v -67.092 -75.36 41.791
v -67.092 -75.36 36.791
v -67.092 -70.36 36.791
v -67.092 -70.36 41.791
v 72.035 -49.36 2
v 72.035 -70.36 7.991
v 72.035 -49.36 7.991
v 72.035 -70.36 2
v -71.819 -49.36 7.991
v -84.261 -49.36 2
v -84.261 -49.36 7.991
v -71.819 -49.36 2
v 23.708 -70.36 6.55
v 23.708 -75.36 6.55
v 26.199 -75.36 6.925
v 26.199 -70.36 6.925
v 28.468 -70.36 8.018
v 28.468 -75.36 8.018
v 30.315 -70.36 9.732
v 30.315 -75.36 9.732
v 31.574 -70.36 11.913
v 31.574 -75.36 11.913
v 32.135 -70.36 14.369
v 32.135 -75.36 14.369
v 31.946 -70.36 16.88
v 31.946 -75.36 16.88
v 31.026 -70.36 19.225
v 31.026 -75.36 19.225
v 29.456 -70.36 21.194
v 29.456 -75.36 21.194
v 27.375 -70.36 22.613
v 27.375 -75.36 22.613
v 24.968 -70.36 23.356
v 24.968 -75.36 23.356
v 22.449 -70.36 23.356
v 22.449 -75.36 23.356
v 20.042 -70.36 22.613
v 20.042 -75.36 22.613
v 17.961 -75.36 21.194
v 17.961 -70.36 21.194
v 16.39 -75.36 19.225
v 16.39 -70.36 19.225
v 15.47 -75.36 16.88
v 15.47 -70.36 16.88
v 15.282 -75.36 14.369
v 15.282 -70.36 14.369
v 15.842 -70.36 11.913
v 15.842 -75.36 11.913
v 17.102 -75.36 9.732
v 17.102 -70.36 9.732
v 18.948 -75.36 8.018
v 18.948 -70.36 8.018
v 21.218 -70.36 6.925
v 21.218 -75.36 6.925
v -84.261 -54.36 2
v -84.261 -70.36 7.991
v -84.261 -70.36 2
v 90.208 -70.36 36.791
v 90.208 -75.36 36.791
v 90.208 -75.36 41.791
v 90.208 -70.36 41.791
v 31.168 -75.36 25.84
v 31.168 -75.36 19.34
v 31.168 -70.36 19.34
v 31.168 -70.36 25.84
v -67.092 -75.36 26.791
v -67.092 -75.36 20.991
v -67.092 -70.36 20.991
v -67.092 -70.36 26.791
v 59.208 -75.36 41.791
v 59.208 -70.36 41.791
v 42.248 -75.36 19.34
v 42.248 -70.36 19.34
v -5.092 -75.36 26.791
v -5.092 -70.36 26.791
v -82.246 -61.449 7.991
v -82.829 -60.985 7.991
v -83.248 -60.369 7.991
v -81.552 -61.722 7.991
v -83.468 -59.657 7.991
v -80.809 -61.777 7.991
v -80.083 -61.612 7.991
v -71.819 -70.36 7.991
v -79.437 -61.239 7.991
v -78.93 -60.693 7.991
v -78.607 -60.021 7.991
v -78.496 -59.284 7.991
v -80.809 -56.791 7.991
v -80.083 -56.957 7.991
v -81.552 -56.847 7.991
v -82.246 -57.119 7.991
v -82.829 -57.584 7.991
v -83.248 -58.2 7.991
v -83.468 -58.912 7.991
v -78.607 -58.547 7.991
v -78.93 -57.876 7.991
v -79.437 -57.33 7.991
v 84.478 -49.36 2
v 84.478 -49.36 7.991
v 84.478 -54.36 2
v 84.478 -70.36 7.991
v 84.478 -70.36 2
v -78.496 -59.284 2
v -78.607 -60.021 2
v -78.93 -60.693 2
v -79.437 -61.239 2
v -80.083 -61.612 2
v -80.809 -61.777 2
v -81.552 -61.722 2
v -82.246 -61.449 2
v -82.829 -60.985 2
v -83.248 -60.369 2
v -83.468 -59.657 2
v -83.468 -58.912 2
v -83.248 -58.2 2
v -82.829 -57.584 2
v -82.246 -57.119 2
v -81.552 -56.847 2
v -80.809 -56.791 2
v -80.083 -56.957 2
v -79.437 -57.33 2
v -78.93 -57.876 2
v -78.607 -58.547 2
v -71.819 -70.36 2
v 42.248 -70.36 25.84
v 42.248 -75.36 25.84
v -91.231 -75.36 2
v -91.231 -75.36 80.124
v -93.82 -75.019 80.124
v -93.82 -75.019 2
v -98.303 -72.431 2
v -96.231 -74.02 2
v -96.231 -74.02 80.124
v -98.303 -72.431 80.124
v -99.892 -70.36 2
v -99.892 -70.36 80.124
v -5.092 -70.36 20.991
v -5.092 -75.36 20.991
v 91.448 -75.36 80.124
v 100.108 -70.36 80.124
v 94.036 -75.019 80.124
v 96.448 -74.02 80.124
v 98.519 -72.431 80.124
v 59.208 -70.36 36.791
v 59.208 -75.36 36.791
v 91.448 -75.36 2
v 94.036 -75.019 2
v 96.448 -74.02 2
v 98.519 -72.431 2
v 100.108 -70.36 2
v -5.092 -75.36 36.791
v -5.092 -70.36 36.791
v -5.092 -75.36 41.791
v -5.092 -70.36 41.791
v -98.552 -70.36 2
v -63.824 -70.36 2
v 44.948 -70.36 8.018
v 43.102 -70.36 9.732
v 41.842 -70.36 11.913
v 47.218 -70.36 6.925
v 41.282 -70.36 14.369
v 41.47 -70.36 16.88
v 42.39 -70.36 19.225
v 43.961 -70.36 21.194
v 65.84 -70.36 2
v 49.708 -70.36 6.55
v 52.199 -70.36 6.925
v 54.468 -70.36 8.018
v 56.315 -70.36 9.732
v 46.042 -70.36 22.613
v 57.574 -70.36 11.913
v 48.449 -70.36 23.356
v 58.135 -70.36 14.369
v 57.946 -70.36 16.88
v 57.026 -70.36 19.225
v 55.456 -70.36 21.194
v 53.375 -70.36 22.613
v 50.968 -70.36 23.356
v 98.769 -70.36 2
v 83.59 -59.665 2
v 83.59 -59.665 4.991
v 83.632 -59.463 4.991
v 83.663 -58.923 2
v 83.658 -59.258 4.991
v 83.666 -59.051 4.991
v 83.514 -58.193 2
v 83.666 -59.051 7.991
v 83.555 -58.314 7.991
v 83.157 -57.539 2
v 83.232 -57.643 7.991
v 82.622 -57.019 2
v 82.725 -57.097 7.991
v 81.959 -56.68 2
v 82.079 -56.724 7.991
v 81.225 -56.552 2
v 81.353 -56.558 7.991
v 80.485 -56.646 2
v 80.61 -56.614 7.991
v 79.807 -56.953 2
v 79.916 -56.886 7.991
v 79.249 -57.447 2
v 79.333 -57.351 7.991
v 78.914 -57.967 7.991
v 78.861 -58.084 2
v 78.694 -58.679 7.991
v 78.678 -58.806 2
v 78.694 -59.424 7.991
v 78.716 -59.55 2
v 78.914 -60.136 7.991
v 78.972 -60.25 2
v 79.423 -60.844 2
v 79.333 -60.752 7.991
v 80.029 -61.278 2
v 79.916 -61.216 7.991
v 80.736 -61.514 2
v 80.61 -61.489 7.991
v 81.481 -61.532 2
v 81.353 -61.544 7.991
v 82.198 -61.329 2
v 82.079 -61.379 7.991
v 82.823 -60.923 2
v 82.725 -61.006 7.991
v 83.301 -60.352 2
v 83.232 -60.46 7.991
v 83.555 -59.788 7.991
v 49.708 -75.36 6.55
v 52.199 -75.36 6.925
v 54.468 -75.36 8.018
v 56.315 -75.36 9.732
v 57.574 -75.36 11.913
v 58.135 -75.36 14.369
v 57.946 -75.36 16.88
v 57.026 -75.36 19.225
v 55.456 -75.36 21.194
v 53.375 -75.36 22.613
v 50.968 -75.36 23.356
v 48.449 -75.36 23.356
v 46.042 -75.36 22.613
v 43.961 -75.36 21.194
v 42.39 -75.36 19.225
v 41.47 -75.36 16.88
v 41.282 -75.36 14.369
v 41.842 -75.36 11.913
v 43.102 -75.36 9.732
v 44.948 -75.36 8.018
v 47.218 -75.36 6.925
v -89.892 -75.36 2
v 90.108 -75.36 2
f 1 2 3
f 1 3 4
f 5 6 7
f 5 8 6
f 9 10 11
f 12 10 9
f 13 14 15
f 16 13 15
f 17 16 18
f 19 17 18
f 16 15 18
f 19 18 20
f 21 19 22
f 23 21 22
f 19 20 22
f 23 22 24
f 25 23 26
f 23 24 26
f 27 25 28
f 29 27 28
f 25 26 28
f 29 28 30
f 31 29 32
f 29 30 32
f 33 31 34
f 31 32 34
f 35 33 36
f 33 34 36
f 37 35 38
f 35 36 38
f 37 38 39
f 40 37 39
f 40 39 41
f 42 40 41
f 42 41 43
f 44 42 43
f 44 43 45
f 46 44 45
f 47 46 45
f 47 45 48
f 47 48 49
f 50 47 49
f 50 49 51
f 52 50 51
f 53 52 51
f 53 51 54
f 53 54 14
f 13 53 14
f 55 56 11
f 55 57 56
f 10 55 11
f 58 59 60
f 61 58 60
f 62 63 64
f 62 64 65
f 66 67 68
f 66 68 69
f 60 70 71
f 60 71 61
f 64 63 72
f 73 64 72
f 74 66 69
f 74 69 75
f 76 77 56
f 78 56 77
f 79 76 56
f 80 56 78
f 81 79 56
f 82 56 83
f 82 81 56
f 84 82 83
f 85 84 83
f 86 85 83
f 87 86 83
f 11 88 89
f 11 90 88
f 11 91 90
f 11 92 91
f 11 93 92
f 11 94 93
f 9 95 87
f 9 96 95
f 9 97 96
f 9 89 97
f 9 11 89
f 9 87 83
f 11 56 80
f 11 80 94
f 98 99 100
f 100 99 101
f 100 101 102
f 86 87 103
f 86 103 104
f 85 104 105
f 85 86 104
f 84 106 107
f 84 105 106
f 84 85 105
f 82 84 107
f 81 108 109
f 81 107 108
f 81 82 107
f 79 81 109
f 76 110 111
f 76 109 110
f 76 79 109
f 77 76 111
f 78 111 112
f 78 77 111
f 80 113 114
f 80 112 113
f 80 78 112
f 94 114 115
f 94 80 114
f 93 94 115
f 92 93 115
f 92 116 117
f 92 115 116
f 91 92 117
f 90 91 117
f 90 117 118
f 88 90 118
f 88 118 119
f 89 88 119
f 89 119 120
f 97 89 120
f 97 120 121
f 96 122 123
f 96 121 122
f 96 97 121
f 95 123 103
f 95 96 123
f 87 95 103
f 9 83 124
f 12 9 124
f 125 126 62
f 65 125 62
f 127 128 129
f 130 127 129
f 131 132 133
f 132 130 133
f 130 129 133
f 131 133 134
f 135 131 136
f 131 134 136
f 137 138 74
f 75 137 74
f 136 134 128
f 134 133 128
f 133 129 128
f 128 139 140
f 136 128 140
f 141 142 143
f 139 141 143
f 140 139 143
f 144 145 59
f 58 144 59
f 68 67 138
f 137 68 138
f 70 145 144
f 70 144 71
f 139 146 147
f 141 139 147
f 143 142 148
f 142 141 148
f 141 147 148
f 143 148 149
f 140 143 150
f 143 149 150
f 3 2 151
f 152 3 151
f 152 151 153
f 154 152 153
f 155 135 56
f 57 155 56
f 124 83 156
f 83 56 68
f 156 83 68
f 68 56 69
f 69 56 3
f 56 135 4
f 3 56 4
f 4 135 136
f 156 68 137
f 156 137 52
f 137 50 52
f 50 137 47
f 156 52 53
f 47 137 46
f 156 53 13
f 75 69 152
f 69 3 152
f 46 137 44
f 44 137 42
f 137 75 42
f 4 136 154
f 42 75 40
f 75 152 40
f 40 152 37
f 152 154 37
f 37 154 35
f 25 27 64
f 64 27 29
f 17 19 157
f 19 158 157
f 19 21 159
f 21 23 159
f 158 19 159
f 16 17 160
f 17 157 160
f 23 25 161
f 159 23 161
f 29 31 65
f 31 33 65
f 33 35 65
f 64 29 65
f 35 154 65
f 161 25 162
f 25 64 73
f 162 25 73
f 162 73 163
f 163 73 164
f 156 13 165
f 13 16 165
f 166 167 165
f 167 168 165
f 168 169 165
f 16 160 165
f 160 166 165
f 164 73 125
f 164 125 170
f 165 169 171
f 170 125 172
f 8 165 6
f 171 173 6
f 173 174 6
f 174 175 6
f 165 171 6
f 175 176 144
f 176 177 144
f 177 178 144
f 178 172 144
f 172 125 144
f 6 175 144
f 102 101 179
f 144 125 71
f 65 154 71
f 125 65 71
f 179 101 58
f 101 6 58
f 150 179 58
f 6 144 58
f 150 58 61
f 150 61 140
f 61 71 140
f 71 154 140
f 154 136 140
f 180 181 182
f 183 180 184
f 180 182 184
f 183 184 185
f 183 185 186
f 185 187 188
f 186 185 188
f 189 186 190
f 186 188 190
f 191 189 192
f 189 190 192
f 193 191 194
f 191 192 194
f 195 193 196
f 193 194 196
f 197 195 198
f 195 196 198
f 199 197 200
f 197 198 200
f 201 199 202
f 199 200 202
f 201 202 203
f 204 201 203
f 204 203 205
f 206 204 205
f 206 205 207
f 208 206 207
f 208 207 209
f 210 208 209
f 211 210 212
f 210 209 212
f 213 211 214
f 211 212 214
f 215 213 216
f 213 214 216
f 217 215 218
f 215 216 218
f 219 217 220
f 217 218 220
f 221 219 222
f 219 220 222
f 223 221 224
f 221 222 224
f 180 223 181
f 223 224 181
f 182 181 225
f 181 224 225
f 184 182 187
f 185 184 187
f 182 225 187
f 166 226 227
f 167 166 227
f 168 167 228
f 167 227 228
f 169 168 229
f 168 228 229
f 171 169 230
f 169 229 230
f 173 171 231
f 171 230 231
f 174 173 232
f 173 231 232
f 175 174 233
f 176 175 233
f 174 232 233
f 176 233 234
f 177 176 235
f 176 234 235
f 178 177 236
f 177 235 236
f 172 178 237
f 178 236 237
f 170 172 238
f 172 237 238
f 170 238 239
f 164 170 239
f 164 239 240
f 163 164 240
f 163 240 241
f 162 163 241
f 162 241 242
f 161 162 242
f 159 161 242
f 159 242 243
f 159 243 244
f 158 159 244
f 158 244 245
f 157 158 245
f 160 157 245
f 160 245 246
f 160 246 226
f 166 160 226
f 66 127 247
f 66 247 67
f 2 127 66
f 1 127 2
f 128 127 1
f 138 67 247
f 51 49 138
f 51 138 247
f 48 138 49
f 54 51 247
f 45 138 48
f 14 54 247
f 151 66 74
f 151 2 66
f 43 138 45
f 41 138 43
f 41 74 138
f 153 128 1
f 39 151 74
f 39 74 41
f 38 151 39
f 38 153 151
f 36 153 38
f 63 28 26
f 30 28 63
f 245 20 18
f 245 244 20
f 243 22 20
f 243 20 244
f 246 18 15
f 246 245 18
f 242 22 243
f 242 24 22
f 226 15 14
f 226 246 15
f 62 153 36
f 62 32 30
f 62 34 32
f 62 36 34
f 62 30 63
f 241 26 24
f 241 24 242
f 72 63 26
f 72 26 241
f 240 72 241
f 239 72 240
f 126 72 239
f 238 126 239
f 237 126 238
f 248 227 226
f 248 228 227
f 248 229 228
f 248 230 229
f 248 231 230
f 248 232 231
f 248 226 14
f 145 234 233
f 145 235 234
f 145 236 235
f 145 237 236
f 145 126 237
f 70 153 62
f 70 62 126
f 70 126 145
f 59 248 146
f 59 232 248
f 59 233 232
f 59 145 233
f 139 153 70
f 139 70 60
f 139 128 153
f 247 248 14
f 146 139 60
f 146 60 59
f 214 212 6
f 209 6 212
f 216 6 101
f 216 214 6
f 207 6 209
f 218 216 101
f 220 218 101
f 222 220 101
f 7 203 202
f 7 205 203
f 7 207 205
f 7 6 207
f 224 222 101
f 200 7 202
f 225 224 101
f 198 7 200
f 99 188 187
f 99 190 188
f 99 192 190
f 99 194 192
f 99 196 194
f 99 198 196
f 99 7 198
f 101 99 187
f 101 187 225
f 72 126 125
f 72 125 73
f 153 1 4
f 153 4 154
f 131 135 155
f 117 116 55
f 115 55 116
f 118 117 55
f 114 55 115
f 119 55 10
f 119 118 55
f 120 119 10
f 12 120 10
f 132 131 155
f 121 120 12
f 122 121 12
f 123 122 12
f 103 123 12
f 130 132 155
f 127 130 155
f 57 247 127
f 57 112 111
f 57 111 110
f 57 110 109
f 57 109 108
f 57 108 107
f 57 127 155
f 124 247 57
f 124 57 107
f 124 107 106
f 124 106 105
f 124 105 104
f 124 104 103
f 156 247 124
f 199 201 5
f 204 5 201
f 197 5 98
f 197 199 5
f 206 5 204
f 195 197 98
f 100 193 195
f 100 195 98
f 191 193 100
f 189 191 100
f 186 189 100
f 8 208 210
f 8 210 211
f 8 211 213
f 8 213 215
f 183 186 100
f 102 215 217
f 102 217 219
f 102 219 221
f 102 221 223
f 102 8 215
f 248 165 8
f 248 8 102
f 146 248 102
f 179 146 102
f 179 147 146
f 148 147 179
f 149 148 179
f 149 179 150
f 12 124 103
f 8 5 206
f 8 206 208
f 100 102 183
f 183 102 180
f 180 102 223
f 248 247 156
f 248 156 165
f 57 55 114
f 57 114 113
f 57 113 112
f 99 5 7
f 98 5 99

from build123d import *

# Parameters (mm, degrees)
CROQUIS2_W              = 200
CROQUIS2_H              = 150
CROQUIS2_R              = 2
CROQUIS2_R_2            = 2.5
CROQUIS2_W_2            = 31.297292299
CROQUIS2_H_2            = 43.768728426
CROQUIS2_H_3            = 43.768728427
CROQUIS2_W_3            = 23.573907934
CROQUIS2_H_4            = 45.323962431
SALIENTE_EXTRUIR1_DEPTH = 2
REDONDEO1_R             = 10
BOSS_EXTRUDE1_DEPTH     = 25
SKETCH3_W               = 62.040442094
SKETCH3_H               = 5.530821024
BOSS_EXTRUDE2_DEPTH     = 22
SKETCH8_W               = 62.040442094
SKETCH8_H               = 5.530821024
BOSS_EXTRUDE6_DEPTH     = 13
SKETCH2_W               = 200
SKETCH2_H               = 78.124132015
SKETCH2_W_2             = 62.040442094
SKETCH2_H_2             = 5.530821024
BOSS_EXTRUDE3_DEPTH     = 5
SKETCH4_W               = 62.040442094
SKETCH4_H               = 5.530821024
BOSS_EXTRUDE4_DEPTH     = 19
SKETCH5_W               = 7.442573222
SKETCH5_H               = 2.991451355
BOSS_EXTRUDE5_DEPTH     = 21
SKETCH6_R               = 2.5
CUT_EXTRUDE1_DEPTH      = 151.539762497
FILLET1_R               = 10
CUT_EXTRUDE2_DEPTH      = 153.054859813
CUT_EXTRUDE2_DEPTH_BACK = 13
SKETCH9_R               = 2.463920505
SKETCH9_R_2             = 2.5
SKETCH9_W               = 62.040442094
SKETCH9_H               = 4.214652984
CUT_EXTRUDE3_DEPTH      = 26
CUT_EXTRUDE3_DEPTH_BACK = 215.68865463
SKETCH10_W              = 2
SKETCH10_H              = 21
SKETCH11_W              = 62
SKETCH11_H              = 5.8
SKETCH11_H_2            = 5
SKETCH11_W_2            = 31
CUT_EXTRUDE4_DEPTH      = 130.932832439
CROQUIS4_W              = 2.991451355
CROQUIS4_H              = 16
SALIENTE_EXTRUIR2_DEPTH = 5
CROQUIS5_W              = 12.442573222
CROQUIS5_H              = 2.991451355
SALIENTE_EXTRUIR3_DEPTH = 5
CROQUIS7_W              = 12.442573222
CROQUIS7_H              = 21
SALIENTE_EXTRUIR4_DEPTH = 3
CORTAR_EXTRUIR3_START   = -15
CROQUIS8_R              = 2.5
CORTAR_EXTRUIR3_DEPTH   = 15
CROQUIS9_W              = 2.991451355
CROQUIS9_H              = 16
SALIENTE_EXTRUIR5_DEPTH = 5
CROQUIS10_W             = 12.442573222
CROQUIS10_H             = 2.991451355
SALIENTE_EXTRUIR6_DEPTH = 5
CROQUIS11_W             = 12.442573222
CROQUIS11_H             = 21
SALIENTE_EXTRUIR7_DEPTH = 3
CORTAR_EXTRUIR4_START   = -11
CROQUIS12_R             = 2.5
CORTAR_EXTRUIR4_DEPTH   = 11
CROQUIS15_R             = 8.45
CROQUIS15_W             = 10
CROQUIS15_H             = 5
CORTAR_EXTRUIR8_DEPTH   = 111
CORTAR_EXTRUIR10_DEPTH  = 10


with BuildPart() as part:
    # Croquis2 → Saliente-Extruir1 (new body)
    with BuildSketch(Plane.XY):
        with Locations((0.108263467, -0.36008145)):
            Rectangle(CROQUIS2_W, CROQUIS2_H)
        with Locations((89.108263467, -66.5)):
            Circle(CROQUIS2_R, mode=Mode.SUBTRACT)
        with Locations((-88.891736533, -66.5)):
            Circle(CROQUIS2_R, mode=Mode.SUBTRACT)
        with Locations(Location((89.108263467, 65.779837101, 0), (0, 0, 180))):
            Circle(CROQUIS2_R, mode=Mode.SUBTRACT)
        with Locations(Location((-88.891736533, 65.779837101, 0), (0, 0, 180))):
            Circle(CROQUIS2_R, mode=Mode.SUBTRACT)
        with Locations((-80.865436179, -59.36008145)):
            Circle(CROQUIS2_R_2, mode=Mode.SUBTRACT)
        with Locations((81.108263467, -59.36008145)):
            Circle(CROQUIS2_R_2, mode=Mode.SUBTRACT)
        with Locations(Location((81.108263467, 58.63991855, 0), (0, 0, 180))):
            Circle(CROQUIS2_R_2, mode=Mode.SUBTRACT)
        with Locations(Location((-80.865436179, 58.63991855, 0), (0, 0, 180))):
            Circle(CROQUIS2_R_2, mode=Mode.SUBTRACT)
        with BuildLine():
            Line((-62.091736533, 70.63991855), (64.108263467, 70.63991855))
            ThreePointArc((64.108263467, 70.63991855), (66.108263467, 68.63991855), (64.108263467, 66.63991855))
            Line((64.108263467, 66.63991855), (-62.091736533, 66.63991855))
            ThreePointArc((-62.091736533, 66.63991855), (-64.091736533, 68.63991855), (-62.091736533, 70.63991855))
        make_face(mode=Mode.SUBTRACT)
        Polygon((-71.391736533, -12.902447307), (-71.391736533, 12.182284408), (-79.241736533, 12.28991855), (-83.891736533, 12.28991855), (-83.891736533, -13.01008145), (-79.241736533, -13.01008145), align=None, mode=Mode.SUBTRACT)
        with BuildLine():
            Line((92.108263467, 45.478381757), (92.108263467, -46.198544657))
            ThreePointArc((92.108263467, -46.198544657), (90.807295546, -47.897576736), (89.108263467, -46.596608814))
            Line((89.108263467, -46.596608814), (89.108263467, 45.876445915))
            ThreePointArc((89.108263467, 45.876445915), (90.807295546, 47.177413836), (92.108263467, 45.478381757))
        make_face(mode=Mode.SUBTRACT)
        Polygon((84.108263467, 12.28991855), (84.108263467, -13.01008145), (79.458263467, -13.01008145), (71.608263467, -13.01008145), (71.608263467, 12.28991855), (79.458263467, 12.28991855), align=None, mode=Mode.SUBTRACT)
        with BuildLine():
            Line((-91.891736533, 45.478381757), (-91.891736533, -46.198544657))
            ThreePointArc((-91.891736533, -46.198544657), (-90.590768612, -47.897576736), (-88.891736533, -46.596608814))
            Line((-88.891736533, -46.596608814), (-88.891736533, 45.876445915))
            ThreePointArc((-88.891736533, 45.876445915), (-90.590768612, 47.177413836), (-91.891736533, 45.478381757))
        make_face(mode=Mode.SUBTRACT)
        with Locations((-30.011405388, 36.299005811)):
            Rectangle(CROQUIS2_W_2, CROQUIS2_H_2, mode=Mode.SUBTRACT)
        with BuildLine():
            Line((-62.091736533, -71.36008145), (64.108263467, -71.36008145))
            ThreePointArc((64.108263467, -71.36008145), (66.108263467, -69.36008145), (64.108263467, -67.36008145))
            Line((64.108263467, -67.36008145), (-62.091736533, -67.36008145))
            ThreePointArc((-62.091736533, -67.36008145), (-64.091736533, -69.36008145), (-62.091736533, -71.36008145))
        make_face(mode=Mode.SUBTRACT)
        with Locations((-30.011405388, -26.799059535)):
            Rectangle(CROQUIS2_W_2, CROQUIS2_H_3, mode=Mode.SUBTRACT)
        with Locations((12.982877294, -0.693345879)):
            Rectangle(CROQUIS2_W_3, CROQUIS2_H_4, mode=Mode.SUBTRACT)
    extrude(amount=SALIENTE_EXTRUIR1_DEPTH)

    # Redondeo1
    redondeo1_edges = [part.edges().sort_by_distance(p)[0] for p in [
        (100.108263467, -75.36008145, 1),
        (-99.891736533, -75.36008145, 1),
        (-99.891736533, 74.63991855, 1),
        (100.108263467, 74.63991855, 1),
    ]]
    fillet(redondeo1_edges, radius=REDONDEO1_R)

    # Sketch1 → Boss-Extrude1 (add)
    with BuildSketch(Plane.XY.offset(2)):
        Polygon((-67.071845217, 64.63991855), (-67.071845217, 60.63991855), (-8.841198185, 60.63991855), (-8.841198185, 3.63991855), (-67.071845217, 3.63991855), (-67.071845217, -0.36008145), (-8.841198185, -0.36008145), (-8.841198185, -53.36008145), (-67.071845217, -53.36008145), (-67.071845217, -57.574734434), (-5.031403123, -57.574734434), (-5.031403123, -40.931443482), (46.608263467, -40.931443482), (46.608263467, -36.931443482), (-5.031403123, -36.931443482), (-5.031403123, 30.068556518), (46.608263467, 30.068556518), (46.608263467, 34.068556518), (-5.031403123, 34.068556518), (-5.031403123, 64.63991855), align=None)
    extrude(amount=BOSS_EXTRUDE1_DEPTH)

    # Sketch3 → Boss-Extrude2 (add)
    with BuildSketch(Plane.XZ.offset(57.574734434)):
        with Locations((-36.05162417, 24.234589488)):
            Rectangle(SKETCH3_W, SKETCH3_H)
    extrude(amount=BOSS_EXTRUDE2_DEPTH)

    # Sketch8 → Boss-Extrude6 (add)
    with BuildSketch(Plane(origin=(0, 64.63991855, 0), x_dir=(1, 0, 0), z_dir=(0, 1, 0))):
        with Locations((-36.05162417, -24.234589488)):
            Rectangle(SKETCH8_W, SKETCH8_H)
    extrude(amount=BOSS_EXTRUDE6_DEPTH)

    # Sketch2 → Boss-Extrude3 (add)
    with BuildSketch(Plane.XZ.offset(75.36008145)):
        with Locations((0.108263467, 41.062066008)):
            Rectangle(SKETCH2_W, SKETCH2_H)
        with Locations((-36.05162417, 24.234589488)):
            Rectangle(SKETCH2_W_2, SKETCH2_H_2, mode=Mode.SUBTRACT)
    extrude(amount=-BOSS_EXTRUDE3_DEPTH)

    # Sketch4 → Boss-Extrude4 (add)
    with BuildSketch(Plane(origin=(0, 64.63991855, 0), x_dir=(1, 0, 0), z_dir=(0, 1, 0))):
        with Locations((-36.05162417, -24.234589488)):
            Rectangle(SKETCH4_W, SKETCH4_H)
    extrude(amount=BOSS_EXTRUDE4_DEPTH)

    # Sketch5 → Boss-Extrude5 (add)
    with BuildSketch(Plane.XZ.offset(75.36008145)):
        with Locations((-80.540187187, 3.495725678)):
            Rectangle(SKETCH5_W, SKETCH5_H)
        with Locations((80.756714122, 3.495725678)):
            Rectangle(SKETCH5_W, SKETCH5_H)
    extrude(amount=-BOSS_EXTRUDE5_DEPTH)

    # Sketch6 → Cut-Extrude1 (cut, through all)
    with BuildSketch(Plane.XY.offset(4.991451355)):
        with Locations((-80.996023003, -59.284349751)):
            Circle(SKETCH6_R)
        with Locations(Location((81.166025964, -59.051385225, 0), (0, 0, 345.800348631))):
            Circle(SKETCH6_R)
    extrude(amount=-CUT_EXTRUDE1_DEPTH, mode=Mode.SUBTRACT)

    # Fillet1
    # the kernel refuses this fillet: 10 mm, written as the material it takes off along each edge
    with BuildSketch(Plane(origin=(-99.891736533, -75.36008145, 101.77476711), x_dir=(1, 0, 0), z_dir=(0, 0, -1)), Plane(origin=(100.108263467, -75.36008145, -19.650635095), x_dir=(-1, 0, 0), z_dir=(0, 0, 1))) as fillet1_piece_1:
        with BuildLine():
            CenterArc((8.660254038, -10), FILLET1_R, 90, 60)
            Line((0, -5), (-0.173205081, -4.9))
            ThreePointArc((-0.173205081, -4.9), (-0.2, -2.5), (-0.2, 0))
            Line((-0.2, 0), (0, 0.2))
            Line((0, 0.2), (8.660254038, 0.2))
            Line((8.660254038, 0.2), (8.660254038, 0))
        make_face()
    extrude(amount=121.425402204, mode=Mode.SUBTRACT)

    # Sketch9 → Cut-Extrude2 (cut, two sides: drawn at the far end of the back side and taken through both)
    with BuildSketch(Plane.XY.offset(2).offset(-CUT_EXTRUDE2_DEPTH_BACK)):
        with Locations((-80.996023003, -59.284349751)):
            Circle(SKETCH9_R)
        with Locations(Location((81.166025964, -59.051385225, 0), (0, 0, 345.800348631))):
            Circle(SKETCH9_R_2)
        Polygon((-84.261473798, -70.36008145), (-84.261473798, -54.36008145), (-76.818900576, -54.36008145), (-76.818900576, -70.36008145), (77.035427511, -70.36008145), (77.035427511, -54.36008145), (84.478000733, -54.36008145), (84.478000733, -70.36008145), (100.108263467, -70.36008145), (100.108263467, 85.68147533), (-108.295057911, 85.68147533), (-108.295057911, -70.36008145), align=None)
        with Locations((-36.05162417, -77.467407942)):
            Rectangle(SKETCH9_W, SKETCH9_H)
    extrude(amount=CUT_EXTRUDE2_DEPTH + CUT_EXTRUDE2_DEPTH_BACK, mode=Mode.SUBTRACT)

    # Sketch10 → Cut-Extrude3 (cut, two sides: drawn at the far end of the back side and taken through both)
    with BuildSketch(Plane.ZY.offset(84.261473798).offset(-CUT_EXTRUDE3_DEPTH_BACK)):
        with Locations((1, -64.86008145)):
            Rectangle(SKETCH10_W, SKETCH10_H)
    extrude(amount=CUT_EXTRUDE3_DEPTH + CUT_EXTRUDE3_DEPTH_BACK, mode=Mode.SUBTRACT)

    # Sketch11 → Cut-Extrude4 (cut, through all)
    with BuildSketch(Plane.XZ.offset(75.36008145)):
        with Locations((-36.091736533, 23.891451355)):
            Rectangle(SKETCH11_W, SKETCH11_H)
        with Locations((-36.091736533, 39.291451355)):
            Rectangle(SKETCH11_W, SKETCH11_H_2)
        with Locations((74.708263467, 39.291451355)):
            Rectangle(SKETCH11_W_2, SKETCH11_H_2)
    extrude(amount=-CUT_EXTRUDE4_DEPTH, mode=Mode.SUBTRACT)

    # Croquis4 → Saliente-Extruir2 (add)
    with BuildSketch(Plane.ZY.offset(-77.035427511)):
        with Locations((3.495725678, -62.36008145)):
            Rectangle(CROQUIS4_W, CROQUIS4_H)
    extrude(amount=SALIENTE_EXTRUIR2_DEPTH)

    # Croquis5 → Saliente-Extruir3 (add)
    with BuildSketch(Plane(origin=(0, -54.36008145, 0), x_dir=(1, 0, 0), z_dir=(0, 1, 0))):
        with Locations((78.256714122, -3.495725678)):
            Rectangle(CROQUIS5_W, CROQUIS5_H)
    extrude(amount=SALIENTE_EXTRUIR3_DEPTH)

    # Croquis7 → Saliente-Extruir4 (add)
    with BuildSketch(Plane.XY.offset(4.991451355)):
        with Locations((78.256714122, -59.86008145)):
            Rectangle(CROQUIS7_W, CROQUIS7_H)
    extrude(amount=SALIENTE_EXTRUIR4_DEPTH)

    # Croquis8 → Cortar-Extruir3 (cut)
    with BuildSketch(Plane(origin=(0, 0, 2), x_dir=(-1, 0, 0), z_dir=(0, 0, -1)).offset(CORTAR_EXTRUIR3_START)):
        with Locations(Location((-81.166025964, -59.051385225, 0), (0, 0, 180))):
            Circle(CROQUIS8_R)
    extrude(amount=CORTAR_EXTRUIR3_DEPTH, mode=Mode.SUBTRACT)

    # Croquis9 → Saliente-Extruir5 (add)
    with BuildSketch(Plane(origin=(-76.818900576, 0, 0), x_dir=(0, 0, -1), z_dir=(1, 0, 0))):
        with Locations((-3.495725678, -62.36008145)):
            Rectangle(CROQUIS9_W, CROQUIS9_H)
    extrude(amount=SALIENTE_EXTRUIR5_DEPTH)

    # Croquis10 → Saliente-Extruir6 (add)
    with BuildSketch(Plane(origin=(0, -54.36008145, 0), x_dir=(1, 0, 0), z_dir=(0, 1, 0))):
        with Locations((-78.040187187, -3.495725678)):
            Rectangle(CROQUIS10_W, CROQUIS10_H)
    extrude(amount=SALIENTE_EXTRUIR6_DEPTH)

    # Croquis11 → Saliente-Extruir7 (add)
    with BuildSketch(Plane.XY.offset(4.991451355)):
        with Locations((-78.040187187, -59.86008145)):
            Rectangle(CROQUIS11_W, CROQUIS11_H)
    extrude(amount=SALIENTE_EXTRUIR7_DEPTH)

    # Croquis12 → Cortar-Extruir4 (cut)
    with BuildSketch(Plane(origin=(0, 0, 2), x_dir=(-1, 0, 0), z_dir=(0, 0, -1)).offset(CORTAR_EXTRUIR4_START)):
        with Locations(Location((80.996023003, -59.284349751, 0), (0, 0, 180))):
            Circle(CROQUIS12_R)
    extrude(amount=CORTAR_EXTRUIR4_DEPTH, mode=Mode.SUBTRACT)

    # Croquis15 → Cortar-Extruir8 (cut)
    with BuildSketch(Plane.XZ.offset(75.36008145)):
        with Locations(Location((23.708263467, 15, 0), (0, 0, 270))):
            Circle(CROQUIS15_R)
        with Locations(Location((49.708263467, 15, 0), (0, 0, 270))):
            Circle(CROQUIS15_R)
        with Locations((36.708263467, 21.84)):
            Rectangle(CROQUIS15_W, CROQUIS15_H)
    extrude(amount=-CORTAR_EXTRUIR8_DEPTH, mode=Mode.SUBTRACT)

    # Croquis16 → Cortar-Extruir10 (cut)
    with BuildSketch(Plane.XZ.offset(75.36008145)):
        Polygon((31.708263467, 25.84), (41.708263467, 25.84), (42.248263467, 25.84), (42.248263467, 19.34), (41.708263467, 19.34), (41.708263467, 24.34), (31.708263467, 24.34), (31.708263467, 19.34), (31.168263467, 19.34), (31.168263467, 25.84), align=None)
    extrude(amount=-CORTAR_EXTRUIR10_DEPTH, mode=Mode.SUBTRACT)


solid = part.part
